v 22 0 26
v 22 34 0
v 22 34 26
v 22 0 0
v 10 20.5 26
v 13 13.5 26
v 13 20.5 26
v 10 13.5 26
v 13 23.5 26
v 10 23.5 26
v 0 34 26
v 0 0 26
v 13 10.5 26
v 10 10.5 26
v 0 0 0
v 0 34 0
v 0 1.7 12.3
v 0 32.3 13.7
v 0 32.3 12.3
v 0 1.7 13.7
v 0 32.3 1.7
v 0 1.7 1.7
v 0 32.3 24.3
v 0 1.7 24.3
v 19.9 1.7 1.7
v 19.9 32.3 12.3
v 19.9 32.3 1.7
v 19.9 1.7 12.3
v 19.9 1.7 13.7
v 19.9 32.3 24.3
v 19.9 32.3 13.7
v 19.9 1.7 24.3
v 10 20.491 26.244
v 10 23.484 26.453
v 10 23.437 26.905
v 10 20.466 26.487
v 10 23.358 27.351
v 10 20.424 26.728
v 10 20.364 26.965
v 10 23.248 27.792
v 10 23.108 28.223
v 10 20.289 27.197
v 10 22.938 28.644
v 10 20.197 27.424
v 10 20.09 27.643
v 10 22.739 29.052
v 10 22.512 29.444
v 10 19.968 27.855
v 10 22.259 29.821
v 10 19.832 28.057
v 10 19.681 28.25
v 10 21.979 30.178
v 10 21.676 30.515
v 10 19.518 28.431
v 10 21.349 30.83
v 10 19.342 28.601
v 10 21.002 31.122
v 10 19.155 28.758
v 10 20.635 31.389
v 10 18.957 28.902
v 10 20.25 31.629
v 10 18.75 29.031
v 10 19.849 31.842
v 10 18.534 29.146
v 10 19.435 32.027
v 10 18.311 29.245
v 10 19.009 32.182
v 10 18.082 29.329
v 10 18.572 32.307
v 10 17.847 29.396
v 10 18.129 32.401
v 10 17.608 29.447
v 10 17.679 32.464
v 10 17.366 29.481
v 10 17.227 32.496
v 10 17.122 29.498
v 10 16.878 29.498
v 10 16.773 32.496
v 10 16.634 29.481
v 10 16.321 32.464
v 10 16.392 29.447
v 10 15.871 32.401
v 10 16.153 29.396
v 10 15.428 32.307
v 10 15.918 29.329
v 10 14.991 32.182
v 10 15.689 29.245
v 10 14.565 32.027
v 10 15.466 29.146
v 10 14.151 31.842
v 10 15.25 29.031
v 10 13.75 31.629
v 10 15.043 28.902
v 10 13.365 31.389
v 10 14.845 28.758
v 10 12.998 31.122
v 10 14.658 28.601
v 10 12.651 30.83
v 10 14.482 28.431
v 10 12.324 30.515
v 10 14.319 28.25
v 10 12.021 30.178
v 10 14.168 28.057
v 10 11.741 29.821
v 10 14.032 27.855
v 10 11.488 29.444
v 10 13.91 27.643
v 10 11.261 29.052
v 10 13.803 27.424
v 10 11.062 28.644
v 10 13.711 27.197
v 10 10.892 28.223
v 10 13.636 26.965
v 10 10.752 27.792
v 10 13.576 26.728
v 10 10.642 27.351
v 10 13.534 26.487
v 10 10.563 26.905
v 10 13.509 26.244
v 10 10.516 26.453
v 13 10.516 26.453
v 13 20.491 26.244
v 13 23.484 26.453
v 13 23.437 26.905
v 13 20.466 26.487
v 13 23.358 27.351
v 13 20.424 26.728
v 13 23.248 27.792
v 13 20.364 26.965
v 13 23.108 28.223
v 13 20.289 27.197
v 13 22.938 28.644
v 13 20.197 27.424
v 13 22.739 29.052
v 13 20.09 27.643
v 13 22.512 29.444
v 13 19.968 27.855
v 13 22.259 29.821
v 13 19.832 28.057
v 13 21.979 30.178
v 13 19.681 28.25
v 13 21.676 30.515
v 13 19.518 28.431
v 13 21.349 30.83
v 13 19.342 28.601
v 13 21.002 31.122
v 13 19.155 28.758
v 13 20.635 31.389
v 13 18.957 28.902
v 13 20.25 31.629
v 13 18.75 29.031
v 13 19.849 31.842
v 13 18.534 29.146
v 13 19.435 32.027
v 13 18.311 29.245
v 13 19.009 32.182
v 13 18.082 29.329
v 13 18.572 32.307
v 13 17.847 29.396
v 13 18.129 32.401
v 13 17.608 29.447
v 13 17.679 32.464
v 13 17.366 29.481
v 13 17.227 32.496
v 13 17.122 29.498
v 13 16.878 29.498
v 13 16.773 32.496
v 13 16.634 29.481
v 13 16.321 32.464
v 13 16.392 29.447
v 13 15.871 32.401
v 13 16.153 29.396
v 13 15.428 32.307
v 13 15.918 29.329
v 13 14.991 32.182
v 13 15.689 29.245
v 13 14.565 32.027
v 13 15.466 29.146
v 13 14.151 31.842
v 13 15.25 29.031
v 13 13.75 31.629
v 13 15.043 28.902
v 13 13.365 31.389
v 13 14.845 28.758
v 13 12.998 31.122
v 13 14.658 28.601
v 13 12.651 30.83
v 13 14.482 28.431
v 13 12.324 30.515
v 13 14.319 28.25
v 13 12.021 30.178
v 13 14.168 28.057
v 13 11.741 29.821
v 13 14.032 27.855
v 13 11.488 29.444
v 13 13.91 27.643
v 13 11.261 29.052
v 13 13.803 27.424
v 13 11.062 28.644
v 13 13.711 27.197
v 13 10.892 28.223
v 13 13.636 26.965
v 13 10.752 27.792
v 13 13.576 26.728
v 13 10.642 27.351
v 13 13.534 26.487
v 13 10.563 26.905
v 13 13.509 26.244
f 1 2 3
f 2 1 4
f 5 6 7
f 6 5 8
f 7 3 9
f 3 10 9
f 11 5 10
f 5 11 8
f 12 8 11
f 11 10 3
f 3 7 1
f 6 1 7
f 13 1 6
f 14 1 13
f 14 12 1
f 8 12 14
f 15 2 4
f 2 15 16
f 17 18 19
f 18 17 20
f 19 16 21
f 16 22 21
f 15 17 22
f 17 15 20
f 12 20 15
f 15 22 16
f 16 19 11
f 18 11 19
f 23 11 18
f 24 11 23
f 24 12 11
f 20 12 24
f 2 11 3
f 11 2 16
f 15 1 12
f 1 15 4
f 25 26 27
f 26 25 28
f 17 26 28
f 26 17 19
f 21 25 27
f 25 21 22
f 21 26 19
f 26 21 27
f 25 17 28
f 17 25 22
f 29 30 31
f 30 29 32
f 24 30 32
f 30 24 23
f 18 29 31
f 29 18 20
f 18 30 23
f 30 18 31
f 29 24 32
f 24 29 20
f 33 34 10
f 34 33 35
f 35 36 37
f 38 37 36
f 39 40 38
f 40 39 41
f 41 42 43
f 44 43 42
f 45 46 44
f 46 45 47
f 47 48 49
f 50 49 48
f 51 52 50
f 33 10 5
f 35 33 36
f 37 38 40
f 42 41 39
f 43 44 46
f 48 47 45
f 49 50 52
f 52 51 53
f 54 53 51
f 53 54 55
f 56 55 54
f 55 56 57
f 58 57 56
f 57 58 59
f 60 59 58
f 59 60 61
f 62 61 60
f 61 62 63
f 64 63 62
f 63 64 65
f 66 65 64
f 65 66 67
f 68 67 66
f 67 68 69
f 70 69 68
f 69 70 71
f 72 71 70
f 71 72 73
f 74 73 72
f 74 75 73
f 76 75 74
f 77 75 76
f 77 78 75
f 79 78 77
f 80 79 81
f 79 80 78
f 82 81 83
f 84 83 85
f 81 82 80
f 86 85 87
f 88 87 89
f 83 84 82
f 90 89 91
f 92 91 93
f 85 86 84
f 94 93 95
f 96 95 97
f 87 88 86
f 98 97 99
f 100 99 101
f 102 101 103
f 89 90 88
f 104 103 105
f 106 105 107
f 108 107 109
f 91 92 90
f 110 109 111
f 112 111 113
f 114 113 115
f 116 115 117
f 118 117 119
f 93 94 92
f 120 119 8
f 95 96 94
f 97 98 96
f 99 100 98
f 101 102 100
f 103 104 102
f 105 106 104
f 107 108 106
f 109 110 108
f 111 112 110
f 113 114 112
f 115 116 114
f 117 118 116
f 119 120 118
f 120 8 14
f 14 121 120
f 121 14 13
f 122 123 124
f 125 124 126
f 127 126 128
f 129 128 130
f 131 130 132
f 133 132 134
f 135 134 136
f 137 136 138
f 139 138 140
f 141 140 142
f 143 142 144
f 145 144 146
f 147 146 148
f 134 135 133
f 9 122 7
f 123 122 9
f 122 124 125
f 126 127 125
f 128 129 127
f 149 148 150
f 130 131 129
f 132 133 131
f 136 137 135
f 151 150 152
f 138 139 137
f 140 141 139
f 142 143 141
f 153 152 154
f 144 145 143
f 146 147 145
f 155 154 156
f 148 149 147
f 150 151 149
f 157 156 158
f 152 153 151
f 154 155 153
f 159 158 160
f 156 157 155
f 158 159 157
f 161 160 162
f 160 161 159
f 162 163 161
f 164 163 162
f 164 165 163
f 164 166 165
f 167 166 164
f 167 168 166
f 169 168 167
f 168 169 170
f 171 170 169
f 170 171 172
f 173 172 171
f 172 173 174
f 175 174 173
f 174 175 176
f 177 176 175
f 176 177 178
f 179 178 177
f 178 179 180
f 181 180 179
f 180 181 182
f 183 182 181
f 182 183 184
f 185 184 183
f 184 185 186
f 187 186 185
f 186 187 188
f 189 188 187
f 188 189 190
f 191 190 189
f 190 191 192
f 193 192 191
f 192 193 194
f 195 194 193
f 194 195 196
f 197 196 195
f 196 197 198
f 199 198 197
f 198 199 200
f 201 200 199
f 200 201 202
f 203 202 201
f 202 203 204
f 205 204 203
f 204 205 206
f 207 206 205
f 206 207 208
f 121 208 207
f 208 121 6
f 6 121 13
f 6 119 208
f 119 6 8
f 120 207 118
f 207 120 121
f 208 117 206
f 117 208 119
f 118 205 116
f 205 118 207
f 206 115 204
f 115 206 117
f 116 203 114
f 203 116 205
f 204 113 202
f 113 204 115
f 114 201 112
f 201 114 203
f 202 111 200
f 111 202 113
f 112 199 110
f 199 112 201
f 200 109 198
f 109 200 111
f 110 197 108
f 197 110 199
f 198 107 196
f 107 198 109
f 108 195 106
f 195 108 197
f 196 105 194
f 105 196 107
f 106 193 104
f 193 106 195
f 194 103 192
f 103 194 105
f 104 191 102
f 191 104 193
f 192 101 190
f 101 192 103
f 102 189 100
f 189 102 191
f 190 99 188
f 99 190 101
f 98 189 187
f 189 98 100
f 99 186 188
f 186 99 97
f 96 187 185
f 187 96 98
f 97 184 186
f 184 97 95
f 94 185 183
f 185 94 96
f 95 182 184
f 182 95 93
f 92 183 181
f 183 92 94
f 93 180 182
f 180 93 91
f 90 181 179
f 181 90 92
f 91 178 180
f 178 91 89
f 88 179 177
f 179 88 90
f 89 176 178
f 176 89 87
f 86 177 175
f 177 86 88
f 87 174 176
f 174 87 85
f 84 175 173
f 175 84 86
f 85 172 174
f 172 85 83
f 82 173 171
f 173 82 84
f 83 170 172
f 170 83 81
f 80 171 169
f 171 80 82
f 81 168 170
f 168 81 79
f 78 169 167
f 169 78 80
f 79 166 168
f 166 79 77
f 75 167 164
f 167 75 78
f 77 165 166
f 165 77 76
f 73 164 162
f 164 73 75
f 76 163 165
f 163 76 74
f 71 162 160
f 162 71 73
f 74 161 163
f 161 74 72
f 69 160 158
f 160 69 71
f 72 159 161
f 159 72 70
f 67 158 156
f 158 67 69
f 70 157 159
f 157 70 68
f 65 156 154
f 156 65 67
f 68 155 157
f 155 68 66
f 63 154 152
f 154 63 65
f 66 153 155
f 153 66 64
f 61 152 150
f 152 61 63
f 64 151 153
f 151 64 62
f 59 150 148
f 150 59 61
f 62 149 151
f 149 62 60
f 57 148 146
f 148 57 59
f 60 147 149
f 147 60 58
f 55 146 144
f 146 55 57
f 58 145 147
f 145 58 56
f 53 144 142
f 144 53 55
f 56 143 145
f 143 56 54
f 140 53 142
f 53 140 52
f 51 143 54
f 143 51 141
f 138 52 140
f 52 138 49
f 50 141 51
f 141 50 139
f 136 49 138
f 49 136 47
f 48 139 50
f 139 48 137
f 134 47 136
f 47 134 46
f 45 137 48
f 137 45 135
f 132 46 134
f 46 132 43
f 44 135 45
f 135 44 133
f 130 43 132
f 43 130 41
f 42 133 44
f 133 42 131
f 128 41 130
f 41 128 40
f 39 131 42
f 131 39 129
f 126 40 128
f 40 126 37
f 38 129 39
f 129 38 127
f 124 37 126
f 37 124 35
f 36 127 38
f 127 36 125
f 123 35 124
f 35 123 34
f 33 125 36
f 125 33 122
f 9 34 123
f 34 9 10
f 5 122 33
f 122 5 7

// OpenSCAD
$fn = 90;

difference() {
    cube([22, 34, 26]);
    translate([-0.1, 1.7, 1.7]) cube([20, 30.6, 10.6]);
    translate([-0.1, 1.7, 13.7]) cube([20, 30.6, 10.6]);
}

//translate([0, 2, 14]) drawer();

module drawer() {
    difference() {
        cube([20, 30, 10]);
        translate([1.5, 1.5, 1.5]) cube([17, 27, 10]);
    }
    translate([-1, 15, 5]) sphere(d = 4);
}

translate([10, 17, 26]) rotate([0, -90, 0]) {
    width = 3;   // width of rectangle
    height = 3;   // height of rectang
    curve(width, height, 10, 5);
}

module curve(width, height, length, dh) {
    r = (pow(length/2, 2) + pow(dh, 2))/(2*dh);
    a = 2*asin((length/2)/r);
    translate([-(r -dh), 0, -width/2]) rotate([0, 0, -a/2])         rotate_extrude(angle = a) translate([r, 0, 0]) square(size = [height, width], center = true);
}
